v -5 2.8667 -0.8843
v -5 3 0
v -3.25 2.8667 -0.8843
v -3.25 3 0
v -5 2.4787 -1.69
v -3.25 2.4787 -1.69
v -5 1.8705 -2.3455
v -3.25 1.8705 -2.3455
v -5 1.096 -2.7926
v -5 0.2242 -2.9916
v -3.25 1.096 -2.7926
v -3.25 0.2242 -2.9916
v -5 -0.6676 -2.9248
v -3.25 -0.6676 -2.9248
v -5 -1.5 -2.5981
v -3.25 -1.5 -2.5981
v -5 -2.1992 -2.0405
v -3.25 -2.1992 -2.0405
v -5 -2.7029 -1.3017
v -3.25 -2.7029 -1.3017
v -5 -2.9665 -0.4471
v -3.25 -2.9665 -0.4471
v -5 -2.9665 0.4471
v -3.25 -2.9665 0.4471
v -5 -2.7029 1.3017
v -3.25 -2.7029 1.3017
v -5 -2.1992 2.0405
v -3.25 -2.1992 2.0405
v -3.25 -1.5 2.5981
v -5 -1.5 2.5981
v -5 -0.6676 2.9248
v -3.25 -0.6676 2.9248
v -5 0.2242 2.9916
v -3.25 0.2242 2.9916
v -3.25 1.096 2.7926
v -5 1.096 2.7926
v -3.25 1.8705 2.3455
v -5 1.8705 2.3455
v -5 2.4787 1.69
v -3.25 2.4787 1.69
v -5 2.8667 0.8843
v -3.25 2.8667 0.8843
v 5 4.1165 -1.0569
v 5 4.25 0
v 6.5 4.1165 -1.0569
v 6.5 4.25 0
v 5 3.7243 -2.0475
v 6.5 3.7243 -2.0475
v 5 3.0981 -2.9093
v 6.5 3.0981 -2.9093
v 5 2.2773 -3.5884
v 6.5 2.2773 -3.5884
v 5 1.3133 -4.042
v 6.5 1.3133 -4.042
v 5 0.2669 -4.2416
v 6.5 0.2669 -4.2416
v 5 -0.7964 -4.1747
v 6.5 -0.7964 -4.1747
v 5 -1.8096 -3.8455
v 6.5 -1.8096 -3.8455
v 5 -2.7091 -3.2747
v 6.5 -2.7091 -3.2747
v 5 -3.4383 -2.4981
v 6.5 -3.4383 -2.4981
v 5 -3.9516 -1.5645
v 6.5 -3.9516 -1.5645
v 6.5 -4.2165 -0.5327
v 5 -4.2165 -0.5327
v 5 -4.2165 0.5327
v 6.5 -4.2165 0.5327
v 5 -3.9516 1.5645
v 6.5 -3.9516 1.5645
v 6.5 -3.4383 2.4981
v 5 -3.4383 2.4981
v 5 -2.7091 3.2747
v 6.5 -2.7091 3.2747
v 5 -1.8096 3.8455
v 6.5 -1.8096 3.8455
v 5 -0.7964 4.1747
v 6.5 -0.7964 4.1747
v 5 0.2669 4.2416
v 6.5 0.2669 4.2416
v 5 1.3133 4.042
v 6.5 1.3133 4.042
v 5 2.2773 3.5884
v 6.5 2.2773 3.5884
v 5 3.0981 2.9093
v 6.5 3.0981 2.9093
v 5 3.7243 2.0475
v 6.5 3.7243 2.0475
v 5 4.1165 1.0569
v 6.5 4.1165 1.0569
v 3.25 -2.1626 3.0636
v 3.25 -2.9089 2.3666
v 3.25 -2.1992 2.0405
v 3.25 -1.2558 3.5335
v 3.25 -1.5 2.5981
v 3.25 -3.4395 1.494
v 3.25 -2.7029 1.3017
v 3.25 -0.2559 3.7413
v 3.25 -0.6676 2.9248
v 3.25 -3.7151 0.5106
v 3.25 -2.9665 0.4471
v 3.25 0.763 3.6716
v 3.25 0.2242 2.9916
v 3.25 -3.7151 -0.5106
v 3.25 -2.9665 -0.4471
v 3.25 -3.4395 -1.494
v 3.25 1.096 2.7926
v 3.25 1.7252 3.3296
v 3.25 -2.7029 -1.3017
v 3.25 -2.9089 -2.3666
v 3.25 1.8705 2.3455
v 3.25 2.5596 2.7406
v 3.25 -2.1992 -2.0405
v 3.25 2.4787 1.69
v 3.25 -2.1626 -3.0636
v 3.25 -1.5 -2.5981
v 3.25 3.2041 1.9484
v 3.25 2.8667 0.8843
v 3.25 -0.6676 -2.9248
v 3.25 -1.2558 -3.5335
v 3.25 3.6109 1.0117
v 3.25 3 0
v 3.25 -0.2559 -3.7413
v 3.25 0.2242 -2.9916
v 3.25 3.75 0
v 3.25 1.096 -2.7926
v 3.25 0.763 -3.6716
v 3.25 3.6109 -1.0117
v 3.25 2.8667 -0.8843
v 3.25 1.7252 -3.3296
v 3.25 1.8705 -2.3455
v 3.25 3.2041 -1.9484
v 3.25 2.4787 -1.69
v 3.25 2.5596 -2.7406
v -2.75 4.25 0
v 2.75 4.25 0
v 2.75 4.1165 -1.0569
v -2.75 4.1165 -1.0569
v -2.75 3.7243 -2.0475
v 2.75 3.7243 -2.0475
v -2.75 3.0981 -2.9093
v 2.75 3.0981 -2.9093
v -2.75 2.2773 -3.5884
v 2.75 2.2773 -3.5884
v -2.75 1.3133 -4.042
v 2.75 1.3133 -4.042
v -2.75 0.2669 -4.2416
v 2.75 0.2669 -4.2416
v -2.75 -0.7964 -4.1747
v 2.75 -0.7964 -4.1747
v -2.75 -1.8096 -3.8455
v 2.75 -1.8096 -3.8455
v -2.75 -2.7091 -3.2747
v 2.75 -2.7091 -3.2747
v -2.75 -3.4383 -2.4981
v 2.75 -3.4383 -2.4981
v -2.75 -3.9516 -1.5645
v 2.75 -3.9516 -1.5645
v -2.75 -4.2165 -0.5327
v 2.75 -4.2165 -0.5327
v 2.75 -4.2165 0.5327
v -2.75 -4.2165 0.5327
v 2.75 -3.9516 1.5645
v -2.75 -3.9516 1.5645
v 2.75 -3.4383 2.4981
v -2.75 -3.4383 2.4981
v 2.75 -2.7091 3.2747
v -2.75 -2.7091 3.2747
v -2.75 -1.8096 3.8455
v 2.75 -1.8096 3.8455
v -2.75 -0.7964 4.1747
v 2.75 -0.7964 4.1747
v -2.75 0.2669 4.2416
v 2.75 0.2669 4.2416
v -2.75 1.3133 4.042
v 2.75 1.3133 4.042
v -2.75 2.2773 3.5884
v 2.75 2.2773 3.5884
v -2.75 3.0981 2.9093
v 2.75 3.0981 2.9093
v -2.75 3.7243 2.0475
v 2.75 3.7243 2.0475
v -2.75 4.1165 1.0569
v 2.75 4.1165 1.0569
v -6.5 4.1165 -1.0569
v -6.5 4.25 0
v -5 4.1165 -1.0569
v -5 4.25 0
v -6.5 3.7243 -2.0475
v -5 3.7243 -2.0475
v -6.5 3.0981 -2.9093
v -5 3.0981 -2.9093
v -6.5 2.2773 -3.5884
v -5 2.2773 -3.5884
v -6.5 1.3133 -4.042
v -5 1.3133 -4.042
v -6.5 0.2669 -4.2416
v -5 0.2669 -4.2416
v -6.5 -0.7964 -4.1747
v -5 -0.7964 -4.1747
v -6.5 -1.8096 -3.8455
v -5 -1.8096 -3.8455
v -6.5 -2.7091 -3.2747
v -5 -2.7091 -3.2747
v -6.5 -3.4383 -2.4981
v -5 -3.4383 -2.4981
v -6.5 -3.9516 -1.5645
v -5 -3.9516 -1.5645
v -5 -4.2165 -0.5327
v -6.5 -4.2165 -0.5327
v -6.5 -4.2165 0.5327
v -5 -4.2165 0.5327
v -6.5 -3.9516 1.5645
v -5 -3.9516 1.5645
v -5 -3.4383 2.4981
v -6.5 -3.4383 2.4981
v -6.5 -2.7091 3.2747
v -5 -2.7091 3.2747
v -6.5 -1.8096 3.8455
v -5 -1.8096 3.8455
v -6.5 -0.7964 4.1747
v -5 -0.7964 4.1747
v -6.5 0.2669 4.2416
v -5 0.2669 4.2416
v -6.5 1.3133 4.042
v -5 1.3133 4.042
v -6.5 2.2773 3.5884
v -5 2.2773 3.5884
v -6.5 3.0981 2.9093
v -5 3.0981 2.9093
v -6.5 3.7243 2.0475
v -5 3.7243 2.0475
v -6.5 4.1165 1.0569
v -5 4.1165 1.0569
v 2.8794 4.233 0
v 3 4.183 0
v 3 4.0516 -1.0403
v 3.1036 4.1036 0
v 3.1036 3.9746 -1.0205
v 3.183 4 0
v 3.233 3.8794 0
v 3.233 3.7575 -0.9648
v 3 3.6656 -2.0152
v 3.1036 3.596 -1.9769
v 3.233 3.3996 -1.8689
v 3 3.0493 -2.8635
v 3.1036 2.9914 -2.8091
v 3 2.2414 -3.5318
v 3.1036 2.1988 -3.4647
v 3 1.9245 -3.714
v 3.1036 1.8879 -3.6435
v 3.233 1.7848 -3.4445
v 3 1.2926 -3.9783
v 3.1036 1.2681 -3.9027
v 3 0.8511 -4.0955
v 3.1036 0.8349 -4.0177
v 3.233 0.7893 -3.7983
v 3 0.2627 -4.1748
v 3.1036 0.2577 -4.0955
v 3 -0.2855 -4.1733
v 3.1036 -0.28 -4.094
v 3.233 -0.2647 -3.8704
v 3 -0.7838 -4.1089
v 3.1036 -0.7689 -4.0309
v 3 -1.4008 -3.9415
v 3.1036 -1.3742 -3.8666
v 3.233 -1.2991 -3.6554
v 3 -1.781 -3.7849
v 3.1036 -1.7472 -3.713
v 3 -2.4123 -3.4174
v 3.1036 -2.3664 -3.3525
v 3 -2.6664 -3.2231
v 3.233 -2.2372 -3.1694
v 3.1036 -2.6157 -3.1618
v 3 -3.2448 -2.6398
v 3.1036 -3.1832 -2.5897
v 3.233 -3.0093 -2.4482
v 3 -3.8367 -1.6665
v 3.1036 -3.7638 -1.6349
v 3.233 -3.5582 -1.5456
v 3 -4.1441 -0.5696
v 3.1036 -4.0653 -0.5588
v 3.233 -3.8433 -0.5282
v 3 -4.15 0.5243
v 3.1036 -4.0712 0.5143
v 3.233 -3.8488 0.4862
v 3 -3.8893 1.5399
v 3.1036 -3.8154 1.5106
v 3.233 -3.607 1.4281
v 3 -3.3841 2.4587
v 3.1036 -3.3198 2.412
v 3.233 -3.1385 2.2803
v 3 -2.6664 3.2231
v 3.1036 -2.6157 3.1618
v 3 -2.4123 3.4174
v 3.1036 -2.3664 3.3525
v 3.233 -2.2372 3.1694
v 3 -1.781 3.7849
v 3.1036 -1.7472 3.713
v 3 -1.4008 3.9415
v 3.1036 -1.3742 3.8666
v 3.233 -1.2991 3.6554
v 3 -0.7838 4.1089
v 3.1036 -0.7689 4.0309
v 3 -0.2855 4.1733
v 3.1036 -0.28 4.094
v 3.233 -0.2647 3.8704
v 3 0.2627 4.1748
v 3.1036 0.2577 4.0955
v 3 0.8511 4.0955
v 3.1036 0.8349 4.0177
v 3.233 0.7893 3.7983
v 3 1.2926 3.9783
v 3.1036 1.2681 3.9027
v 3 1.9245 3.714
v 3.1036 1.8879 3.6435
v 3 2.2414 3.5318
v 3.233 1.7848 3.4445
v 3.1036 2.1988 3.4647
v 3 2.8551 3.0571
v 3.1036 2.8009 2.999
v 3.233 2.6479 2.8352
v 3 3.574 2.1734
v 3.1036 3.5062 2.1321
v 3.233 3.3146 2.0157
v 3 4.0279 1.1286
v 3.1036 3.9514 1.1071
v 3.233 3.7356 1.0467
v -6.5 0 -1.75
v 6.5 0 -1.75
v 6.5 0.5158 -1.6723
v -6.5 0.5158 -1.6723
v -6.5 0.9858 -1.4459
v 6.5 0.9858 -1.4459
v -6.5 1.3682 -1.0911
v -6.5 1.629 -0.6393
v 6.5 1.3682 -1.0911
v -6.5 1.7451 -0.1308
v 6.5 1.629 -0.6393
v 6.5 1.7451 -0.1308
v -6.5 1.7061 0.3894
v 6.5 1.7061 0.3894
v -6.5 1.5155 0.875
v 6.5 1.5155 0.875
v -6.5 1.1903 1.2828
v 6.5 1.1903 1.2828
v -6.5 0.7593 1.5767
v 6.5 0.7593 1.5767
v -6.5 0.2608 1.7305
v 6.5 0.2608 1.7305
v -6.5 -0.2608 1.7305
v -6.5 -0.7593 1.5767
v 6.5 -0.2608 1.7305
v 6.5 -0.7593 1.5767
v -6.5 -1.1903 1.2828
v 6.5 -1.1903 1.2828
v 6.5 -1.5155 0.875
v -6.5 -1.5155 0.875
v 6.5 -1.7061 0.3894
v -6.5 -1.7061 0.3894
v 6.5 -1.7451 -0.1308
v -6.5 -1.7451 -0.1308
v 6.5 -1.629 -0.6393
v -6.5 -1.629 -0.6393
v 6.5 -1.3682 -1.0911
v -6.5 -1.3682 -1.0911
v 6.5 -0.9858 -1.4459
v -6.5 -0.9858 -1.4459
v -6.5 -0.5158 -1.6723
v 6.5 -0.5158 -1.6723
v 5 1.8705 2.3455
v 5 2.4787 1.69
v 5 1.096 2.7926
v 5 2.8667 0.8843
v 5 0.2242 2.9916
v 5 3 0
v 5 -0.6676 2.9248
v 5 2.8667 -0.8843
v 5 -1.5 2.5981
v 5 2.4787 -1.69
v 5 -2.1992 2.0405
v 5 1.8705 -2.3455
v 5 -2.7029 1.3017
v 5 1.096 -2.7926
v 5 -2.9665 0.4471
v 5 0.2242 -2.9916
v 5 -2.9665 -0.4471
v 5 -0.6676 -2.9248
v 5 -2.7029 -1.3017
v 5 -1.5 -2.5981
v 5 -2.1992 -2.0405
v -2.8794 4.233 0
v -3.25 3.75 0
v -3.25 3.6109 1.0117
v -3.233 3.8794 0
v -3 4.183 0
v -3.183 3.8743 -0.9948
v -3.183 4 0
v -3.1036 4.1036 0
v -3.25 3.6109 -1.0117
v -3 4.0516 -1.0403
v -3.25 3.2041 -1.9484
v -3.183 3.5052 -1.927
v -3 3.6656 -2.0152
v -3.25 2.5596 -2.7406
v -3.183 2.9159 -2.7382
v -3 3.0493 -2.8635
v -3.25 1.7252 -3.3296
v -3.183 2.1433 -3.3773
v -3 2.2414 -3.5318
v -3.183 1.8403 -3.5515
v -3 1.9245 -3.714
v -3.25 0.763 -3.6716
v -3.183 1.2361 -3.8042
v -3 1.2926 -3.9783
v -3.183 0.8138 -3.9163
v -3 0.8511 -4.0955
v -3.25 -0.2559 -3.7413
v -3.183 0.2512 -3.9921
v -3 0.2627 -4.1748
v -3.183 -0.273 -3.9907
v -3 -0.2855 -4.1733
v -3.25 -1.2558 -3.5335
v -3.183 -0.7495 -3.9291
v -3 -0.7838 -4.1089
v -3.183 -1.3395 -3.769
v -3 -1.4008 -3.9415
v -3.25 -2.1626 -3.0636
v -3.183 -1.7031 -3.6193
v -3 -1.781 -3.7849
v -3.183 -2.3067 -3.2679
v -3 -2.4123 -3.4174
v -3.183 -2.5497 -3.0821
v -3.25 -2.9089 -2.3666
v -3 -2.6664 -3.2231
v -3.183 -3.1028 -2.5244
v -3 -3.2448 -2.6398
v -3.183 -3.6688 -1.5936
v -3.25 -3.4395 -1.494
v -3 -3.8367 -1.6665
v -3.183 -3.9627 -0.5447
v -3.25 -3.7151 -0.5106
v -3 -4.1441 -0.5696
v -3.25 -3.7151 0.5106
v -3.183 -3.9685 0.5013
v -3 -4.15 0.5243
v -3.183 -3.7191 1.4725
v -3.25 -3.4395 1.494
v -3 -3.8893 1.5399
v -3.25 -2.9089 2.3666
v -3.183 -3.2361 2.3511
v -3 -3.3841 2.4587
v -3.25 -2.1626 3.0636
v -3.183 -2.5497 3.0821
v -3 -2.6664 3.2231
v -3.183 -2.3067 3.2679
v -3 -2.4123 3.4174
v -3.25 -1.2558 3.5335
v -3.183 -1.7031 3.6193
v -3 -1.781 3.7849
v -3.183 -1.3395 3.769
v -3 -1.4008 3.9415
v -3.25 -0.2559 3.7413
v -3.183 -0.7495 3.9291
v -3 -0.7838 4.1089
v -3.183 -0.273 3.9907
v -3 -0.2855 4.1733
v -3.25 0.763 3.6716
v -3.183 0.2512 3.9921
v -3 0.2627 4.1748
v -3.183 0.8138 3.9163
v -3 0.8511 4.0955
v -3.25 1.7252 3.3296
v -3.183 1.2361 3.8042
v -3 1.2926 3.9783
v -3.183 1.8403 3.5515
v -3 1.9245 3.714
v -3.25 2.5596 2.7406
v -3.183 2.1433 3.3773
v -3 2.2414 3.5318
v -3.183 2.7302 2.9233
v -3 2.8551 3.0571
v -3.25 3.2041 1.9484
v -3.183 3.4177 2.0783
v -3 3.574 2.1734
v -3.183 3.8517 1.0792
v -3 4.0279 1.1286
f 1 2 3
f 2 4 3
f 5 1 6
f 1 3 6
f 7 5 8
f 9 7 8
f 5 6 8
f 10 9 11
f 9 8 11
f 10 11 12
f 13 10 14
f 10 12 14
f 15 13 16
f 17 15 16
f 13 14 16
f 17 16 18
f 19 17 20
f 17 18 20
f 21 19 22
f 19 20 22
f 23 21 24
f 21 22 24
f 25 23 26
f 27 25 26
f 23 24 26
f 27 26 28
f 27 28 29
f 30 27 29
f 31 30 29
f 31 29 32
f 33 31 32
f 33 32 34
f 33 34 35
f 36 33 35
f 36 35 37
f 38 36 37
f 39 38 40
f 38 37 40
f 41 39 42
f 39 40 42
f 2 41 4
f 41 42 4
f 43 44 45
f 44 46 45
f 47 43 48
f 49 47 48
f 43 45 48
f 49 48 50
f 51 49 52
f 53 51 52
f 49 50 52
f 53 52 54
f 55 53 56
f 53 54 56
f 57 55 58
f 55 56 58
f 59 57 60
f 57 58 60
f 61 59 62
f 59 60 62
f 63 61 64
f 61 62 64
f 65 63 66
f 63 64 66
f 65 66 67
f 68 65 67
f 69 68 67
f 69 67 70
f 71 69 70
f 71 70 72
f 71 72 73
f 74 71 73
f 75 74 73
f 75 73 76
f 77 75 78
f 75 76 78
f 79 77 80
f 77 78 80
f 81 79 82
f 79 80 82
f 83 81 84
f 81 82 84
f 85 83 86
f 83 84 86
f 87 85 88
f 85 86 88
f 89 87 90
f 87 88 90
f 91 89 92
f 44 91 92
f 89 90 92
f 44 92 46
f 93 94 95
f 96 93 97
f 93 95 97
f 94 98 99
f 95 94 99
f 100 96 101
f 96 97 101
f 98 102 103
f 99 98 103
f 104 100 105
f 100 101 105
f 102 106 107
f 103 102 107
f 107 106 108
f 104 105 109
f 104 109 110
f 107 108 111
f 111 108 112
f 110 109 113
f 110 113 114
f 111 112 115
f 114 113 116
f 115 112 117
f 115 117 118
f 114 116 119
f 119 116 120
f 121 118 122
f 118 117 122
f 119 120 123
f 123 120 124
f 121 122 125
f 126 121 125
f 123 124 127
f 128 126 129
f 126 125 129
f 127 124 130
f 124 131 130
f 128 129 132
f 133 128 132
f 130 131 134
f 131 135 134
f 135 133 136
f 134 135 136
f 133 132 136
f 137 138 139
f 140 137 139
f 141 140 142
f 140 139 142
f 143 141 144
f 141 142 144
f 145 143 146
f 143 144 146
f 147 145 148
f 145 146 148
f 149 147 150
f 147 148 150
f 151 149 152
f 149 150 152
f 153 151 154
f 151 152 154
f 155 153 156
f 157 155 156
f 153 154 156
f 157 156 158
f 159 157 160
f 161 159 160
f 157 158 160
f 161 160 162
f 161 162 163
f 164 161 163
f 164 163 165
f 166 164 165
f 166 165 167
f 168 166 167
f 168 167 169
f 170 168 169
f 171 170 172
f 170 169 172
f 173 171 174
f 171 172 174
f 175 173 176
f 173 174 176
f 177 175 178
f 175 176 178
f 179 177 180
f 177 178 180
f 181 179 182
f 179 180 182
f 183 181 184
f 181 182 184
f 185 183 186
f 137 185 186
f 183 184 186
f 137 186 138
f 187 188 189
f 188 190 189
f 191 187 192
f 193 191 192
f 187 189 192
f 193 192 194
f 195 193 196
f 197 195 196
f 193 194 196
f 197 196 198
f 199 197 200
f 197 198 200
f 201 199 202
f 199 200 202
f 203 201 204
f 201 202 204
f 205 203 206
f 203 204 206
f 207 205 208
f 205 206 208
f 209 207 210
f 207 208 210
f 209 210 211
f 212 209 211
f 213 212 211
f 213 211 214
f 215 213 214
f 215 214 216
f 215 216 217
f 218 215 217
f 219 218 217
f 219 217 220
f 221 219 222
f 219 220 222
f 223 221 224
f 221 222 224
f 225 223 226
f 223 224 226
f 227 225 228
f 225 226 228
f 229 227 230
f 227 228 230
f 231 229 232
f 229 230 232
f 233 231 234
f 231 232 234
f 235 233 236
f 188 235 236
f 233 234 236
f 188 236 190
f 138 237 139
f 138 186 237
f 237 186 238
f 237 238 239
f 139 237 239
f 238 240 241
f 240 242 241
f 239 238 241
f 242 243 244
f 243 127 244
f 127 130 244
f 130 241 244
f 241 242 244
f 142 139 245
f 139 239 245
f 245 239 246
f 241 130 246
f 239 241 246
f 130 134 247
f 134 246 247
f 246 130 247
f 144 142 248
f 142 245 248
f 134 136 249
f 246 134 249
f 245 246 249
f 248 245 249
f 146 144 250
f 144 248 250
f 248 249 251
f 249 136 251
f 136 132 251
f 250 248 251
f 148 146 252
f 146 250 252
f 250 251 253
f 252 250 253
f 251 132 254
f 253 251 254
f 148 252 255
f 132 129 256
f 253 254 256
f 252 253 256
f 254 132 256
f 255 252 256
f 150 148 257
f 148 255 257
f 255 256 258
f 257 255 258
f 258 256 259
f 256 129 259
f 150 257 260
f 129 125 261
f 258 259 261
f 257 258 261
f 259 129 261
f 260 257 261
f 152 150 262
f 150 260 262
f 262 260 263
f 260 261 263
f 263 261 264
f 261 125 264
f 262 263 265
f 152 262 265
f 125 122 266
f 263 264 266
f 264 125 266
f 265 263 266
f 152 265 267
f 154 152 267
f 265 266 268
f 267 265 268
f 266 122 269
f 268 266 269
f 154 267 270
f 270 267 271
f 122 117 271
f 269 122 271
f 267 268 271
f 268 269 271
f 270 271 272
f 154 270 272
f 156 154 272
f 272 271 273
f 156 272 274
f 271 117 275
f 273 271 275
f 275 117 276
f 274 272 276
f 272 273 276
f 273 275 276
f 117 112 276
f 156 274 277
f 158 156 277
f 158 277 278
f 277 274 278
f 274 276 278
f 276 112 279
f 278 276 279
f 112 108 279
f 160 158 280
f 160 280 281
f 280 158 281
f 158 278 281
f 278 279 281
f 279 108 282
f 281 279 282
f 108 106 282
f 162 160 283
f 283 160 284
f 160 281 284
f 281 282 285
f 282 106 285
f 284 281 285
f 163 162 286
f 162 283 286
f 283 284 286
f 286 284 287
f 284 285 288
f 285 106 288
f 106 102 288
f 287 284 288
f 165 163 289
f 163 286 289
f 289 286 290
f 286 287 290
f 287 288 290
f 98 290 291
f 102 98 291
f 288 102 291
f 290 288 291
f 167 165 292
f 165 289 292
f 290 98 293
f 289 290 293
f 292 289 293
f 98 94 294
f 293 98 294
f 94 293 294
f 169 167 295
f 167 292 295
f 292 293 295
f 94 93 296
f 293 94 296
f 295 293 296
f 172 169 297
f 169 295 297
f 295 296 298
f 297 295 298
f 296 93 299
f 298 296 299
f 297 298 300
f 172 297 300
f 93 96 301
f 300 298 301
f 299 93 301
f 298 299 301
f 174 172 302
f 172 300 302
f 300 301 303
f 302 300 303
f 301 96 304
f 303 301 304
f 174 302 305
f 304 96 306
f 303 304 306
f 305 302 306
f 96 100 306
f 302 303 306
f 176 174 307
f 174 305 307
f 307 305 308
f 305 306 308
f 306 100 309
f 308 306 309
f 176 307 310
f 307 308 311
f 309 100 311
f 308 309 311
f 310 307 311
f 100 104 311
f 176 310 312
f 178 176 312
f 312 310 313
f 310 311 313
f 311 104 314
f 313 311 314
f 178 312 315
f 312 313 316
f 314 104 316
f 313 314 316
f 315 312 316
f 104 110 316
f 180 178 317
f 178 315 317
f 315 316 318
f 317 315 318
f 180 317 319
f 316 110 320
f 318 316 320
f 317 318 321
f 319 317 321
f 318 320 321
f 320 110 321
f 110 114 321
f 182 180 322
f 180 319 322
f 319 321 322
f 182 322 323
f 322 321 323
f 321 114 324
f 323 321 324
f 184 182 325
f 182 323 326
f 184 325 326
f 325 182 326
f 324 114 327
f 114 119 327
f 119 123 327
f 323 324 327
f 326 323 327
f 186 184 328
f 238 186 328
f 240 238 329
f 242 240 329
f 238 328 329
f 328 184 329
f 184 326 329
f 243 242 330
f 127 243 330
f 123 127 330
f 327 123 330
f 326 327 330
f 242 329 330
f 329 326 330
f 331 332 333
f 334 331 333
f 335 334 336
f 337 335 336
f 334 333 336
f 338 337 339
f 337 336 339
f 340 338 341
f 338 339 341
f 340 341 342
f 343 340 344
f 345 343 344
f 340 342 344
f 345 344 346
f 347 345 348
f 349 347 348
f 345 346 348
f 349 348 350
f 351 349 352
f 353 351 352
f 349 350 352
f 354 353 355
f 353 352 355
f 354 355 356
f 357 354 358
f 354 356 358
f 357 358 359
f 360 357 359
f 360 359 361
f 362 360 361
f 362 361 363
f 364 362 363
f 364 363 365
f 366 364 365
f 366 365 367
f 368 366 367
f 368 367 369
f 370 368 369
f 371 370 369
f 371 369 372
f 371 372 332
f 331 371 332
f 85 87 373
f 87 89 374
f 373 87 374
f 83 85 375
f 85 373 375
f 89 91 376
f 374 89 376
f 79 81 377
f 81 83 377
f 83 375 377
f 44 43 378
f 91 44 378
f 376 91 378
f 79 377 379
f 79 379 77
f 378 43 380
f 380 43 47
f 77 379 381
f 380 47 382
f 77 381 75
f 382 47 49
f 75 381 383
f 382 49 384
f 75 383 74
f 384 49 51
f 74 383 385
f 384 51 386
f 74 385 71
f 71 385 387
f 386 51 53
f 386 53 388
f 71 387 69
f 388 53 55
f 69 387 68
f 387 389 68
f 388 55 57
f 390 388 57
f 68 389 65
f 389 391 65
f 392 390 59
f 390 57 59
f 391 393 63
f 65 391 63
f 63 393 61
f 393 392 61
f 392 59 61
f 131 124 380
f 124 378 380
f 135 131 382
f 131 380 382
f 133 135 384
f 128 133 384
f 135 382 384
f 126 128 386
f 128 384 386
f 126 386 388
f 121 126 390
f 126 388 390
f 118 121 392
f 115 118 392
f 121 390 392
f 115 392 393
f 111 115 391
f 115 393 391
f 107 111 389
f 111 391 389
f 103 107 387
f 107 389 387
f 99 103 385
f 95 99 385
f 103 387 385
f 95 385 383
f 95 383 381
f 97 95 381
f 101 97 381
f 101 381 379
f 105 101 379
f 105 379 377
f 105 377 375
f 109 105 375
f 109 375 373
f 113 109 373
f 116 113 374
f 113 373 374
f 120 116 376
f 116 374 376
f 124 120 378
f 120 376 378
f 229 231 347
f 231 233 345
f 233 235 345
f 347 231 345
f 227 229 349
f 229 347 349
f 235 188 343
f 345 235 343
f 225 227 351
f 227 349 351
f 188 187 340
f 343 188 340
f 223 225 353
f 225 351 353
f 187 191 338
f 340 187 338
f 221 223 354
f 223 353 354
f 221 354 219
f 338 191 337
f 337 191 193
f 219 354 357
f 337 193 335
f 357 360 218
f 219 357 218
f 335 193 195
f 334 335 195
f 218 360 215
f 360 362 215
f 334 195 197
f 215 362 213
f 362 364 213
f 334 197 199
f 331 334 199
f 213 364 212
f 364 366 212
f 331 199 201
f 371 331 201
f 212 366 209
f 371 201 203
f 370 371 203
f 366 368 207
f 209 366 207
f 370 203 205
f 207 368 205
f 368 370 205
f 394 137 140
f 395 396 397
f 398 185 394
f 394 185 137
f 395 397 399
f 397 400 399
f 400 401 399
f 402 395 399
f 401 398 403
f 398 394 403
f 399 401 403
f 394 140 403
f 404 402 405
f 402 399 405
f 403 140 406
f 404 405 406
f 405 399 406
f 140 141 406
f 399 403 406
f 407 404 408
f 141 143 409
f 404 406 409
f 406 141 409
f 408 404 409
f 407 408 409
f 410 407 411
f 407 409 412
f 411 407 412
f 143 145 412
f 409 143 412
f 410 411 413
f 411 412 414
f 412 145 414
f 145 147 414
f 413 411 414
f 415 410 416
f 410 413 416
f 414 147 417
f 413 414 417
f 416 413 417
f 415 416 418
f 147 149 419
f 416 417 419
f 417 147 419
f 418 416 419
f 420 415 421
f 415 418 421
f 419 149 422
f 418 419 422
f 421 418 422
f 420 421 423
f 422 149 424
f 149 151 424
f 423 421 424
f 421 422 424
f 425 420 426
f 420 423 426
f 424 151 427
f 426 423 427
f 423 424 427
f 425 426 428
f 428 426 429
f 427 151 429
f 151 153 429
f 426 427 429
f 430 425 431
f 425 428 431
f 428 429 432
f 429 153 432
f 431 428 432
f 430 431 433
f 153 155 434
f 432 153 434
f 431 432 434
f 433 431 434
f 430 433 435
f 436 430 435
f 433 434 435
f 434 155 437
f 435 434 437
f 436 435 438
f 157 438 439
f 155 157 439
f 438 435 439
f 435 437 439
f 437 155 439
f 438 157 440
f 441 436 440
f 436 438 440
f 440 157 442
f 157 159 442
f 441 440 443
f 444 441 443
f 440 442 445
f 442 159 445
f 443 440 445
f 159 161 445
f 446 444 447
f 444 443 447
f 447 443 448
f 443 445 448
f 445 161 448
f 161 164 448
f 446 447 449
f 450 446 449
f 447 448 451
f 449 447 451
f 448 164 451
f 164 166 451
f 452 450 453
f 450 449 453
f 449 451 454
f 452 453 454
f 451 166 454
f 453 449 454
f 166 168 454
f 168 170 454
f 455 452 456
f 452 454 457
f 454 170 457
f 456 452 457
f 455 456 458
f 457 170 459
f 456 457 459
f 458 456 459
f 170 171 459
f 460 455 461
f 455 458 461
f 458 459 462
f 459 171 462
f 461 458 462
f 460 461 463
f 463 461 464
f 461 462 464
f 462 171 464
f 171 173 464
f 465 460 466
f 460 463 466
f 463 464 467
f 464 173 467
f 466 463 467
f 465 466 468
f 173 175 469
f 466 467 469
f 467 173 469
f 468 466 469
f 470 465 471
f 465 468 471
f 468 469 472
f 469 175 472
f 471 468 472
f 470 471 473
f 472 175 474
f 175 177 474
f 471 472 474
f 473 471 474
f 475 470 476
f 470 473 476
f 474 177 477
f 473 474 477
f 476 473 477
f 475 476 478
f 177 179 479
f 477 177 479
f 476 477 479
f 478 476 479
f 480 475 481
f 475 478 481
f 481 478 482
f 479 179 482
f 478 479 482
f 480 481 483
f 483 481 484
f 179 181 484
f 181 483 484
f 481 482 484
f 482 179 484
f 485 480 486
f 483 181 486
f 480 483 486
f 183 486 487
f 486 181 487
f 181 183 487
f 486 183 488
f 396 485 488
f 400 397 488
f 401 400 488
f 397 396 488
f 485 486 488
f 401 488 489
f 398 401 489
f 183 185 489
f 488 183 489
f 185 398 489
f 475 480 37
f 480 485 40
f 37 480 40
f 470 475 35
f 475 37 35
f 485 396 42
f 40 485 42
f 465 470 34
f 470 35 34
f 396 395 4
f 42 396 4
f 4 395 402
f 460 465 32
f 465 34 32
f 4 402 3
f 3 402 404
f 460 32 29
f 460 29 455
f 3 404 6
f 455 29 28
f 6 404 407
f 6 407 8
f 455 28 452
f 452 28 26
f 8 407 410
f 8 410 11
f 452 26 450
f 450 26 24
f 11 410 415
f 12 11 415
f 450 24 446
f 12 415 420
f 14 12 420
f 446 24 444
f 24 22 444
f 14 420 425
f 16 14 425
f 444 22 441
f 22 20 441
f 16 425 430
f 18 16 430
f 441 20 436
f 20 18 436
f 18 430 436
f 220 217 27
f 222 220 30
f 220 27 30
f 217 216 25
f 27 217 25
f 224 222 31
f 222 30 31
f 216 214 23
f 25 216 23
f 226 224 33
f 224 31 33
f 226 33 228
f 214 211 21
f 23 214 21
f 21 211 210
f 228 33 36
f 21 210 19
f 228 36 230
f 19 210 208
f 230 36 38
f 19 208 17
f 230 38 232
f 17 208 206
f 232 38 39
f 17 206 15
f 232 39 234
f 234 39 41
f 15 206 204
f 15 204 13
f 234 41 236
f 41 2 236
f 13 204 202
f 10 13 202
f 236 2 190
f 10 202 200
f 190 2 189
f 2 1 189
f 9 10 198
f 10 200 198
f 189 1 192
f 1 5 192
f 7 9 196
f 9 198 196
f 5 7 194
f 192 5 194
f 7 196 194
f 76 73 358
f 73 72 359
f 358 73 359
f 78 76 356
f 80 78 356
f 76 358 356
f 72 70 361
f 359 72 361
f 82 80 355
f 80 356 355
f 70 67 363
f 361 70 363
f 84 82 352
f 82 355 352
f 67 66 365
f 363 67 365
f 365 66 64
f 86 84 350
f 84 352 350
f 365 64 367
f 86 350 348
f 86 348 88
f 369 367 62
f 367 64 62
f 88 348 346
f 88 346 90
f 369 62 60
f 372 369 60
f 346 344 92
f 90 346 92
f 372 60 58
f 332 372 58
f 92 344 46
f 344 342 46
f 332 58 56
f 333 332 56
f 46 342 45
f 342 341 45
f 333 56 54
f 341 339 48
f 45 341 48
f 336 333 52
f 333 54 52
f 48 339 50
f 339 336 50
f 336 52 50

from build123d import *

# Parameters (mm, degrees)
SKETCH2_R          = 1.75
CUT_EXTRUDE1_DEPTH = 14
FILLET1_R          = 0.5


with BuildPart() as part:
    # Sketch1 → Revolve1 (revolve)
    with BuildSketch(Plane.XY):
        Polygon((-6.5, 0), (-6.5, 4.25), (-5, 4.25), (-5, 3), (-3.25, 3), (-3.25, 4.25), (3.25, 4.25), (3.25, 3), (5, 3), (5, 4.25), (6.5, 4.25), (6.5, 0), align=None)
    revolve(axis=Axis((6.5, 0, 0), (-1, 0, 0)))

    # Sketch2 → Cut-Extrude1 (cut, through all)
    with BuildSketch(Plane(origin=(6.5, 0, 0), x_dir=(0, 0, -1), z_dir=(1, 0, 0))):
        Circle(SKETCH2_R)
    extrude(amount=-CUT_EXTRUDE1_DEPTH, mode=Mode.SUBTRACT)

    # Fillet1
    fillet1_edges = [part.edges().sort_by_distance(p)[0] for p in [
        (3.25, -4.25, 0),
        (-3.25, -4.25, 0),
    ]]
    fillet(fillet1_edges, radius=FILLET1_R)


solid = part.part
